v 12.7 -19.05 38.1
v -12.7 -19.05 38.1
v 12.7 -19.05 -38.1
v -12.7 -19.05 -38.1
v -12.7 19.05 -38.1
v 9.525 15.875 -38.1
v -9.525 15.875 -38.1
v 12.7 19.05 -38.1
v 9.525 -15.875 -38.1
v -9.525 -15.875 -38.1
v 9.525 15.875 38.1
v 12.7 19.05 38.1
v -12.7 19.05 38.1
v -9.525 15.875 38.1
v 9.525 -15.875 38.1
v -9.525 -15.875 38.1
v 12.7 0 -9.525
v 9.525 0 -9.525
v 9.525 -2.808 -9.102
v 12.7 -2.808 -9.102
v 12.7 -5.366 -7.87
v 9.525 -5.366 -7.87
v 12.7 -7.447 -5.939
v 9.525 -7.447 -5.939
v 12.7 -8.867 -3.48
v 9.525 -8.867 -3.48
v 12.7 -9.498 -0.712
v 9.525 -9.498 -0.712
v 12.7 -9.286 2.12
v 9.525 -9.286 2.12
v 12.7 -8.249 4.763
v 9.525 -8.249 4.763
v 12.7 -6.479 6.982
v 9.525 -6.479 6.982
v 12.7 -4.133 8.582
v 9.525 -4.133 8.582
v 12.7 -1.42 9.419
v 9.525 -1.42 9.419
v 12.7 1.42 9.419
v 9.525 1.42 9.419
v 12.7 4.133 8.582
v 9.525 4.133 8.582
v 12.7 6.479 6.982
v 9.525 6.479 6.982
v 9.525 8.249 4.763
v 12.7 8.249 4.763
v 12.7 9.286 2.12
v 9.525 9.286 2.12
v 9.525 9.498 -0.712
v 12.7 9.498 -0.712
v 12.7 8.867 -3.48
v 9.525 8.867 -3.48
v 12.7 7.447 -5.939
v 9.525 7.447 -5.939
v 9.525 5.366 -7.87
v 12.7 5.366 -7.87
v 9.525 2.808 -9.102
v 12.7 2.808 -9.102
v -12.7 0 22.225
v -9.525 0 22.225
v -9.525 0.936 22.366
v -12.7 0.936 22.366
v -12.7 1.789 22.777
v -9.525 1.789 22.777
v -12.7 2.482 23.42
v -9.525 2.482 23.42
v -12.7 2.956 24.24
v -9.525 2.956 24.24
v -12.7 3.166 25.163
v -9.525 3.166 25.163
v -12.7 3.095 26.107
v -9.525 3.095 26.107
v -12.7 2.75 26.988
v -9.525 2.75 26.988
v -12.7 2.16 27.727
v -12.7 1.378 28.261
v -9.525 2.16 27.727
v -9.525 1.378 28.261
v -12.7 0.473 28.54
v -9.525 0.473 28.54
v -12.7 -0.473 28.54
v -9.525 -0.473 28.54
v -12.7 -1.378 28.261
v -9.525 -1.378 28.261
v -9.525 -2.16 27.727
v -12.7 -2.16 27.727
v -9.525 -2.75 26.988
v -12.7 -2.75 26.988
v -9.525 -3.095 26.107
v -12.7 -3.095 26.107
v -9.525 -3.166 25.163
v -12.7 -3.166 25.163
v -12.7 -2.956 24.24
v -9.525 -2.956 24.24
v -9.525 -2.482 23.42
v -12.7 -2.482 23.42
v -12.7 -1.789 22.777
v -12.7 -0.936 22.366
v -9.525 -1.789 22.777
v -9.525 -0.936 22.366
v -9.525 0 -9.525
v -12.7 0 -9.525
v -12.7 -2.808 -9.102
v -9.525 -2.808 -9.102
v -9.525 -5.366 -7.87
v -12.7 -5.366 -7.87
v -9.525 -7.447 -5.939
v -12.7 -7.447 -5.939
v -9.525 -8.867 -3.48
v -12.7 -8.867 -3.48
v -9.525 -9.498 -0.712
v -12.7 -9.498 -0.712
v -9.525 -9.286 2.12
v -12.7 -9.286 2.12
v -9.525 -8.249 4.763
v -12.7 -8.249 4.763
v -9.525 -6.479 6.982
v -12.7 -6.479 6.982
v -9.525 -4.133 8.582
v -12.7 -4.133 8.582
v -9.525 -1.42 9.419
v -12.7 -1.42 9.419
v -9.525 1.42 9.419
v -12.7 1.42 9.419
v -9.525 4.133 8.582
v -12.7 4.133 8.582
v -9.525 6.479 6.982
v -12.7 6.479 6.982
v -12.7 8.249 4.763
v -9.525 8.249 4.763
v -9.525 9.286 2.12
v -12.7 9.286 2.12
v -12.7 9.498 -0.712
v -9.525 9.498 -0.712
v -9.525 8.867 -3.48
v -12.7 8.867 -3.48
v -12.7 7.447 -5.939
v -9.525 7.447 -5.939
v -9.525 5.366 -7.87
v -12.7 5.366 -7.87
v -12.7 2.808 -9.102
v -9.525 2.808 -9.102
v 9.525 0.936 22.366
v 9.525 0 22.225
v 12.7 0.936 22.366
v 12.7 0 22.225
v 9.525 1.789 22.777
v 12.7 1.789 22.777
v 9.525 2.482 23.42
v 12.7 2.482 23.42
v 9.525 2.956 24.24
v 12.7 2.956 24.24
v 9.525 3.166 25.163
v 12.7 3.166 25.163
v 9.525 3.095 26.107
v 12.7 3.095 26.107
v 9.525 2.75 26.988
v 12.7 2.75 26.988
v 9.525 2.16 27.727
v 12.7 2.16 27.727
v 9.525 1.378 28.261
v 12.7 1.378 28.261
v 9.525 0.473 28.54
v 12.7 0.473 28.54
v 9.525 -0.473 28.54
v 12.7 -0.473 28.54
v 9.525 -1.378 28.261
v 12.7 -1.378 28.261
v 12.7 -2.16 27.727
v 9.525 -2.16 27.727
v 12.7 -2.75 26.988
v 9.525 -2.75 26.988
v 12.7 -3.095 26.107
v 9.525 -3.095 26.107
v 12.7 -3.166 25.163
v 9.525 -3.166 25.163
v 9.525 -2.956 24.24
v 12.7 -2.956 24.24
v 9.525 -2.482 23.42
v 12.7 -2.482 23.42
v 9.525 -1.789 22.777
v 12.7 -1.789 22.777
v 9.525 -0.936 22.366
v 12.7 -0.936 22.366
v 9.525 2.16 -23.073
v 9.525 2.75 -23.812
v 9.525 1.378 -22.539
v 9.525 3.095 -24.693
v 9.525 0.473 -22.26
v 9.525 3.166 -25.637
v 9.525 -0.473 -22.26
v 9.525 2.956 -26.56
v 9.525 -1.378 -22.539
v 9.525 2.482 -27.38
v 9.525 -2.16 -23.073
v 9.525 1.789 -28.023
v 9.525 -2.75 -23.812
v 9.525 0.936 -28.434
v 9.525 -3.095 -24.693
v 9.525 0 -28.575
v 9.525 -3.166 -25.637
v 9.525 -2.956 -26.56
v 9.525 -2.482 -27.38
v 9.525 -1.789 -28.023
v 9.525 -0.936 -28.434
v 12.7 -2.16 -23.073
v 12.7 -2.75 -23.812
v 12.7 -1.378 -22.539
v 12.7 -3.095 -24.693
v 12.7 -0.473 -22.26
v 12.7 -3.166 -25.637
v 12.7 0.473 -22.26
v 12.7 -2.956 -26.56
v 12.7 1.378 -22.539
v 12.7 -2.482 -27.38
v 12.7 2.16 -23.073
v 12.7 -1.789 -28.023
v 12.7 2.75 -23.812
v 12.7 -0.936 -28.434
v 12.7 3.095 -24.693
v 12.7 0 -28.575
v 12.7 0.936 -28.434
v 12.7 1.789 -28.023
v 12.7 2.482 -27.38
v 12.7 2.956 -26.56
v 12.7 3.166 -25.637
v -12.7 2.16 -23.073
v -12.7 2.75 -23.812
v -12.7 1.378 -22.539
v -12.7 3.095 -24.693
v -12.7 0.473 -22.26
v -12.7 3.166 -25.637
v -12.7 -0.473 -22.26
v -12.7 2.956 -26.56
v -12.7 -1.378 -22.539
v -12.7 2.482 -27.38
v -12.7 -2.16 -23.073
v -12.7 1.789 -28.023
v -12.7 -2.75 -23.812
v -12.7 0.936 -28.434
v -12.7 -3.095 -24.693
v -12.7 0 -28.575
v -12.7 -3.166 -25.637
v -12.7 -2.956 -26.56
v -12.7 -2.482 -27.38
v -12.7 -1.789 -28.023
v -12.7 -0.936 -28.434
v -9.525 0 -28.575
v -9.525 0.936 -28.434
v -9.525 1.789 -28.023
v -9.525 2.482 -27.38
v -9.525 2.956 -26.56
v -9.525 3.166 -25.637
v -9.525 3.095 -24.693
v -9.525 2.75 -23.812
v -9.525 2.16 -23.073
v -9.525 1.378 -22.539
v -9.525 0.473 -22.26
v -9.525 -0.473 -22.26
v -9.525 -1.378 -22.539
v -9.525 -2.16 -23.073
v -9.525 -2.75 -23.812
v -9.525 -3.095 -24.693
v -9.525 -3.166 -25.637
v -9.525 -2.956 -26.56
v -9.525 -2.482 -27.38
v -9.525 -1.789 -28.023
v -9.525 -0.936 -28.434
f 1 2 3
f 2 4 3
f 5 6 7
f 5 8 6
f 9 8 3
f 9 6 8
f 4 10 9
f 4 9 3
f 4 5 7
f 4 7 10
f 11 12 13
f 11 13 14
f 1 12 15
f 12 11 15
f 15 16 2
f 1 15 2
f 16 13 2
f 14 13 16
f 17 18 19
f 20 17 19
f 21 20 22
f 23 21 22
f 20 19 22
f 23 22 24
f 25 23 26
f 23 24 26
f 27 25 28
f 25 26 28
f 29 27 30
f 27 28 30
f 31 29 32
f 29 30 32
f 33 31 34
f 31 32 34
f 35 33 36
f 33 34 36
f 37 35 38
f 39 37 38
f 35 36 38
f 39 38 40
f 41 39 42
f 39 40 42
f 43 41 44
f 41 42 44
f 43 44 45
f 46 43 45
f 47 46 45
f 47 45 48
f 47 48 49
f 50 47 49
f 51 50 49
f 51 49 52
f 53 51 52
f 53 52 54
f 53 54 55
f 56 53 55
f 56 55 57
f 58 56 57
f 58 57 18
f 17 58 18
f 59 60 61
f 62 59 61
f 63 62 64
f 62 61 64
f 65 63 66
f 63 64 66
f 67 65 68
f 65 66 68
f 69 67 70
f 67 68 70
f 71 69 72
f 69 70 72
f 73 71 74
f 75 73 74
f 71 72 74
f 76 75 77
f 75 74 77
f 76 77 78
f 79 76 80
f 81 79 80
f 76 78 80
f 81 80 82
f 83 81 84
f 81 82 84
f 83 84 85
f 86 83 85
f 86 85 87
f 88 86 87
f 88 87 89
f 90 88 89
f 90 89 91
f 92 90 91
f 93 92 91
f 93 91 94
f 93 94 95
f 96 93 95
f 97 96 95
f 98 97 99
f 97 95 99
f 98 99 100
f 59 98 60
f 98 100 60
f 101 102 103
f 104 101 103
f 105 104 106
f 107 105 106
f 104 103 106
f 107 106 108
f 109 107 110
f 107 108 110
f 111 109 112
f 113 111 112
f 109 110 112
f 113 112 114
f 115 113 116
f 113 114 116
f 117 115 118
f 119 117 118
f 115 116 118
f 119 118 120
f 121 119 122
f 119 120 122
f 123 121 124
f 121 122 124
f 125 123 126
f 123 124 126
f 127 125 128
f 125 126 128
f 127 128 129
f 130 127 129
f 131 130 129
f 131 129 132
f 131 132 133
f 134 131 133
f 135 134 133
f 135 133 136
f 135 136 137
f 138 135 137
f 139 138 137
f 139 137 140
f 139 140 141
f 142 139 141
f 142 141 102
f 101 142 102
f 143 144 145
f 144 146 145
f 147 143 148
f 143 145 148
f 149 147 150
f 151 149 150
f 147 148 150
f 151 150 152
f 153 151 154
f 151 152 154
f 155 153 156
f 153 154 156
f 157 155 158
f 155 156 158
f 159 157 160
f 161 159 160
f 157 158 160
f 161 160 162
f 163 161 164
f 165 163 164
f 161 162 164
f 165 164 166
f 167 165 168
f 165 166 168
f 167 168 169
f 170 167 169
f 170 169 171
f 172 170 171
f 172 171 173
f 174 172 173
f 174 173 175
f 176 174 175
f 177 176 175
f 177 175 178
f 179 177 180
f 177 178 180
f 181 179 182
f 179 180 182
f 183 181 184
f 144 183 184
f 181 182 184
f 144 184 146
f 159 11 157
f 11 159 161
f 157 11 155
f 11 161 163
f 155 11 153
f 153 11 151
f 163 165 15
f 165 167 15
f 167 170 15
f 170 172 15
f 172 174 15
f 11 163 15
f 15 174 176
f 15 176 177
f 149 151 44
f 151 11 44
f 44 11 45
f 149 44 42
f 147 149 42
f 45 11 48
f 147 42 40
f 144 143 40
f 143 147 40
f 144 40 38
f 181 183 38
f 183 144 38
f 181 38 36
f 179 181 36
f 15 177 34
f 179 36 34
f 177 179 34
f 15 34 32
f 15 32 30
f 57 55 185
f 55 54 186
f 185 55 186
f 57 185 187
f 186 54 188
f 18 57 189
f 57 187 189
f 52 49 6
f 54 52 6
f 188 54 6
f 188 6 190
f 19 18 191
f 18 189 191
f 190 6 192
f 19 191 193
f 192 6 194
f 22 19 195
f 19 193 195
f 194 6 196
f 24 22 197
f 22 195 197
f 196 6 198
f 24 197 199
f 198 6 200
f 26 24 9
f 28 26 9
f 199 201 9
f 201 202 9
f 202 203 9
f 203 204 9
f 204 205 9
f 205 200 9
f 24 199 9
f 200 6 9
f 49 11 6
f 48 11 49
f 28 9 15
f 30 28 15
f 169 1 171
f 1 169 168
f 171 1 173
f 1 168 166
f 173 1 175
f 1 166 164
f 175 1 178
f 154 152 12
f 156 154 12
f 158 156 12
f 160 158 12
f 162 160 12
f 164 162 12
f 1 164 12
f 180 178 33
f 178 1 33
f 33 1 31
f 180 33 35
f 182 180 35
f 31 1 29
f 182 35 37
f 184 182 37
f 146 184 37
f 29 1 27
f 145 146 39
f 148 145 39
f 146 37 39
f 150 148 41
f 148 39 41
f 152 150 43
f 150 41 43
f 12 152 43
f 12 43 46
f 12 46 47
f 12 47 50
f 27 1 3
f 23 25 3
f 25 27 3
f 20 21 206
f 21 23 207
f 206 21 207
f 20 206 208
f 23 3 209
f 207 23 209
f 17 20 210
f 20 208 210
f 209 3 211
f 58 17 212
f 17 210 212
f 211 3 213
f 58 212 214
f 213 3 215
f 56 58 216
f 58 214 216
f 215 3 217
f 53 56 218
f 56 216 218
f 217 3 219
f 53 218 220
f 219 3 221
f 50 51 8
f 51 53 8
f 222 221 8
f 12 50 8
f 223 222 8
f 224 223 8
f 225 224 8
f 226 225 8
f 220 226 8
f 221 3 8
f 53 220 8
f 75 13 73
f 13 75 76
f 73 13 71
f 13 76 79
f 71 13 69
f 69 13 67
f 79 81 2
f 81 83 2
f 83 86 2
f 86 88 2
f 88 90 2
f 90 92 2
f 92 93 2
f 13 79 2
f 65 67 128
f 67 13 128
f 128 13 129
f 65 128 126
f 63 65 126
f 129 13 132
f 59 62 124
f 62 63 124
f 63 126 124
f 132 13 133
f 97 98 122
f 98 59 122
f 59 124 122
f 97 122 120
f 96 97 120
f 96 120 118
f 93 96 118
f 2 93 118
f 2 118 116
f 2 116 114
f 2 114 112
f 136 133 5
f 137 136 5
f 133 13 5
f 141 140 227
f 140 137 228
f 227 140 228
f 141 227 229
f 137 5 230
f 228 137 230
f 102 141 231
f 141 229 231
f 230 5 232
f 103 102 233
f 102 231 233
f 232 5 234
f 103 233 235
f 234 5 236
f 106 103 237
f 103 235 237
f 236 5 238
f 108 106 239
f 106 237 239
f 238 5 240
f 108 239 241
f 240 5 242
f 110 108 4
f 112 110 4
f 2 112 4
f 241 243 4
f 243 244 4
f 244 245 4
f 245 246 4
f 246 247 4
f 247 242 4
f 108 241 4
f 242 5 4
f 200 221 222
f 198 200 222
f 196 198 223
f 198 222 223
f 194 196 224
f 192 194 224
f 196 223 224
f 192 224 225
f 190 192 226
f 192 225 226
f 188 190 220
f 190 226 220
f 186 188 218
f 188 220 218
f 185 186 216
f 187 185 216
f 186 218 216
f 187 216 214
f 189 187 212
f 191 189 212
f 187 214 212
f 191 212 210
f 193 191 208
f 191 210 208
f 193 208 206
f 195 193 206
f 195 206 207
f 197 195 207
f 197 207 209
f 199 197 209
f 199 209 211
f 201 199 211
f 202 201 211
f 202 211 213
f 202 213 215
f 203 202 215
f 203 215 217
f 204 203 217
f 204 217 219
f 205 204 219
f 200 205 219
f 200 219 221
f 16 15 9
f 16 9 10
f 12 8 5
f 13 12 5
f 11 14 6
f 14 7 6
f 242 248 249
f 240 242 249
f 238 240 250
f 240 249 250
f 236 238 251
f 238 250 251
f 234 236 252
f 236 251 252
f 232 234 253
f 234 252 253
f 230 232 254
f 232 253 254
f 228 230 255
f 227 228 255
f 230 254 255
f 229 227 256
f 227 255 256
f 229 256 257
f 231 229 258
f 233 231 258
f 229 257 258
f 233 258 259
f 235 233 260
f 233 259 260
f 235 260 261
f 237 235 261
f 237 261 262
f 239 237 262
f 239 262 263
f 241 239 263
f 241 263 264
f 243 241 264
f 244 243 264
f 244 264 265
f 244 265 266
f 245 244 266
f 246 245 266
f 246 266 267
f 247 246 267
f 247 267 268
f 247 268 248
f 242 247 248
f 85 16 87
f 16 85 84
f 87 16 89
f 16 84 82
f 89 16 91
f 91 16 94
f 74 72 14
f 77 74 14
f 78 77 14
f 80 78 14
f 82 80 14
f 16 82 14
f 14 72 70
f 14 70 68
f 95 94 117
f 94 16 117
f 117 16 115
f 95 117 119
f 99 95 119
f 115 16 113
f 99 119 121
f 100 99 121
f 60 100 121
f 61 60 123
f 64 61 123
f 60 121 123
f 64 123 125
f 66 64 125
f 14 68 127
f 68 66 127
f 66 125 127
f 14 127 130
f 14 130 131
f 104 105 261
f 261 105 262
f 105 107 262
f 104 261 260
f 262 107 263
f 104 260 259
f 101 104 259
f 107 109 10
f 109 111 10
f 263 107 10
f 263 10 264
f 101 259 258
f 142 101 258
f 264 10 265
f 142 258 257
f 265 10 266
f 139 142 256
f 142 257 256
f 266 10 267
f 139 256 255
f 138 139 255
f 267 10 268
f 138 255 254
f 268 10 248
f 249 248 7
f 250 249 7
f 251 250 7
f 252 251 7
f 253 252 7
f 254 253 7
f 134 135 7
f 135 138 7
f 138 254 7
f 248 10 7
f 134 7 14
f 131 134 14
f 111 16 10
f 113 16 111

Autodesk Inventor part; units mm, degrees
ref_plane "YZ Plane" through (0, 0, 0) normal (1, 0, 0) x (0, 1, 0)
ref_plane "XZ Plane" through (0, 0, 0) normal (0, 1, 0) x (-1, 0, 0)
ref_plane "XY Plane" through (0, 0, 0) normal (0, 0, 1) x (1, 0, 0)
sketch "Sketch1" plane through (0, 0, 0) normal (0, 0, 1) x (1, 0, 0)
  line L0 (-12.7, -19.05) -> (12.7, -19.05)
  line L1 (12.7, -19.05) -> (12.7, 19.05)
  line L2 (12.7, 19.05) -> (-12.7, 19.05)
  line L3 (-12.7, 19.05) -> (-12.7, -19.05)
  line L4 (-12.7, -19.05) -> (12.7, 19.05) construction
  line L5 (12.7, -19.05) -> (-12.7, 19.05) construction
  line L6 (-9.525, 15.875) -> (9.525, 15.875)
  line L7 (9.525, 15.875) -> (9.525, -15.875)
  line L8 (9.525, -15.875) -> (-9.525, -15.875)
  line L9 (-9.525, -15.875) -> (-9.525, 15.875)
  point P0 (0, 0)
  dimension "d0" = 25.4
  dimension "d1" = 38.1
  dimension "d2" = 3.175
extrude "Extrusion1" add sketch "Sketch1" along normal mid plane 127
sketch "Sketch2" plane through (12.7, -19.05, 63.5) normal (1, 0, 0) x (0, 0, -1)
  circle A0 centre (63.5, 19.05) radius 3.175
  dimension "d5" = 6.35
extrude "Extrusion2" cut sketch "Sketch2" against normal through all
pattern_linear "Rectangular Pattern1" count 4 spacing 25.4 along (0, 0, 1) of "Extrusion2" first direction both ways yes
hole "Hole1" at (12.7, 0, 0) direction (-1, 0, 0) diameter 15.875 end through all
hole "Hole2" at (12.7, 0, 0) direction (-1, 0, 0) diameter 19.05 end through all
sketch "Sketch3" plane through (12.7, -19.05, 63.5) normal (1, 0, 0) x (0, 0, -1)
  line L0 (127, 38.1) -> (0, 38.1) projected
  line L1 (63.5, 38.1) -> (63.5, 0)
  line L2 (0, 0) -> (127, 0) projected
  line L3 (25.4, 38.1) -> (25.4, 0)
  line L4 (0, 0) -> (0, 38.1) projected
  line L5 (101.6, 38.1) -> (101.6, 0)
  line L6 (127, 38.1) -> (127, 0) projected
  point P0 (63.5, 19.05)
  dimension "d29" = 25.4
  dimension "d30" = 25.4
split body "Split1" sketch "Sketch3" result one side removed curves L3 removed pieces at (12.2, -13.7506, 50.6724)
split body "Split2" sketch "Sketch3" result one side removed curves L5 removed pieces at (12.2, -6.35, -55.0333)
properties part number "2AM-17-P-5209 - cylinder mount" material "Aluminum 6061"
